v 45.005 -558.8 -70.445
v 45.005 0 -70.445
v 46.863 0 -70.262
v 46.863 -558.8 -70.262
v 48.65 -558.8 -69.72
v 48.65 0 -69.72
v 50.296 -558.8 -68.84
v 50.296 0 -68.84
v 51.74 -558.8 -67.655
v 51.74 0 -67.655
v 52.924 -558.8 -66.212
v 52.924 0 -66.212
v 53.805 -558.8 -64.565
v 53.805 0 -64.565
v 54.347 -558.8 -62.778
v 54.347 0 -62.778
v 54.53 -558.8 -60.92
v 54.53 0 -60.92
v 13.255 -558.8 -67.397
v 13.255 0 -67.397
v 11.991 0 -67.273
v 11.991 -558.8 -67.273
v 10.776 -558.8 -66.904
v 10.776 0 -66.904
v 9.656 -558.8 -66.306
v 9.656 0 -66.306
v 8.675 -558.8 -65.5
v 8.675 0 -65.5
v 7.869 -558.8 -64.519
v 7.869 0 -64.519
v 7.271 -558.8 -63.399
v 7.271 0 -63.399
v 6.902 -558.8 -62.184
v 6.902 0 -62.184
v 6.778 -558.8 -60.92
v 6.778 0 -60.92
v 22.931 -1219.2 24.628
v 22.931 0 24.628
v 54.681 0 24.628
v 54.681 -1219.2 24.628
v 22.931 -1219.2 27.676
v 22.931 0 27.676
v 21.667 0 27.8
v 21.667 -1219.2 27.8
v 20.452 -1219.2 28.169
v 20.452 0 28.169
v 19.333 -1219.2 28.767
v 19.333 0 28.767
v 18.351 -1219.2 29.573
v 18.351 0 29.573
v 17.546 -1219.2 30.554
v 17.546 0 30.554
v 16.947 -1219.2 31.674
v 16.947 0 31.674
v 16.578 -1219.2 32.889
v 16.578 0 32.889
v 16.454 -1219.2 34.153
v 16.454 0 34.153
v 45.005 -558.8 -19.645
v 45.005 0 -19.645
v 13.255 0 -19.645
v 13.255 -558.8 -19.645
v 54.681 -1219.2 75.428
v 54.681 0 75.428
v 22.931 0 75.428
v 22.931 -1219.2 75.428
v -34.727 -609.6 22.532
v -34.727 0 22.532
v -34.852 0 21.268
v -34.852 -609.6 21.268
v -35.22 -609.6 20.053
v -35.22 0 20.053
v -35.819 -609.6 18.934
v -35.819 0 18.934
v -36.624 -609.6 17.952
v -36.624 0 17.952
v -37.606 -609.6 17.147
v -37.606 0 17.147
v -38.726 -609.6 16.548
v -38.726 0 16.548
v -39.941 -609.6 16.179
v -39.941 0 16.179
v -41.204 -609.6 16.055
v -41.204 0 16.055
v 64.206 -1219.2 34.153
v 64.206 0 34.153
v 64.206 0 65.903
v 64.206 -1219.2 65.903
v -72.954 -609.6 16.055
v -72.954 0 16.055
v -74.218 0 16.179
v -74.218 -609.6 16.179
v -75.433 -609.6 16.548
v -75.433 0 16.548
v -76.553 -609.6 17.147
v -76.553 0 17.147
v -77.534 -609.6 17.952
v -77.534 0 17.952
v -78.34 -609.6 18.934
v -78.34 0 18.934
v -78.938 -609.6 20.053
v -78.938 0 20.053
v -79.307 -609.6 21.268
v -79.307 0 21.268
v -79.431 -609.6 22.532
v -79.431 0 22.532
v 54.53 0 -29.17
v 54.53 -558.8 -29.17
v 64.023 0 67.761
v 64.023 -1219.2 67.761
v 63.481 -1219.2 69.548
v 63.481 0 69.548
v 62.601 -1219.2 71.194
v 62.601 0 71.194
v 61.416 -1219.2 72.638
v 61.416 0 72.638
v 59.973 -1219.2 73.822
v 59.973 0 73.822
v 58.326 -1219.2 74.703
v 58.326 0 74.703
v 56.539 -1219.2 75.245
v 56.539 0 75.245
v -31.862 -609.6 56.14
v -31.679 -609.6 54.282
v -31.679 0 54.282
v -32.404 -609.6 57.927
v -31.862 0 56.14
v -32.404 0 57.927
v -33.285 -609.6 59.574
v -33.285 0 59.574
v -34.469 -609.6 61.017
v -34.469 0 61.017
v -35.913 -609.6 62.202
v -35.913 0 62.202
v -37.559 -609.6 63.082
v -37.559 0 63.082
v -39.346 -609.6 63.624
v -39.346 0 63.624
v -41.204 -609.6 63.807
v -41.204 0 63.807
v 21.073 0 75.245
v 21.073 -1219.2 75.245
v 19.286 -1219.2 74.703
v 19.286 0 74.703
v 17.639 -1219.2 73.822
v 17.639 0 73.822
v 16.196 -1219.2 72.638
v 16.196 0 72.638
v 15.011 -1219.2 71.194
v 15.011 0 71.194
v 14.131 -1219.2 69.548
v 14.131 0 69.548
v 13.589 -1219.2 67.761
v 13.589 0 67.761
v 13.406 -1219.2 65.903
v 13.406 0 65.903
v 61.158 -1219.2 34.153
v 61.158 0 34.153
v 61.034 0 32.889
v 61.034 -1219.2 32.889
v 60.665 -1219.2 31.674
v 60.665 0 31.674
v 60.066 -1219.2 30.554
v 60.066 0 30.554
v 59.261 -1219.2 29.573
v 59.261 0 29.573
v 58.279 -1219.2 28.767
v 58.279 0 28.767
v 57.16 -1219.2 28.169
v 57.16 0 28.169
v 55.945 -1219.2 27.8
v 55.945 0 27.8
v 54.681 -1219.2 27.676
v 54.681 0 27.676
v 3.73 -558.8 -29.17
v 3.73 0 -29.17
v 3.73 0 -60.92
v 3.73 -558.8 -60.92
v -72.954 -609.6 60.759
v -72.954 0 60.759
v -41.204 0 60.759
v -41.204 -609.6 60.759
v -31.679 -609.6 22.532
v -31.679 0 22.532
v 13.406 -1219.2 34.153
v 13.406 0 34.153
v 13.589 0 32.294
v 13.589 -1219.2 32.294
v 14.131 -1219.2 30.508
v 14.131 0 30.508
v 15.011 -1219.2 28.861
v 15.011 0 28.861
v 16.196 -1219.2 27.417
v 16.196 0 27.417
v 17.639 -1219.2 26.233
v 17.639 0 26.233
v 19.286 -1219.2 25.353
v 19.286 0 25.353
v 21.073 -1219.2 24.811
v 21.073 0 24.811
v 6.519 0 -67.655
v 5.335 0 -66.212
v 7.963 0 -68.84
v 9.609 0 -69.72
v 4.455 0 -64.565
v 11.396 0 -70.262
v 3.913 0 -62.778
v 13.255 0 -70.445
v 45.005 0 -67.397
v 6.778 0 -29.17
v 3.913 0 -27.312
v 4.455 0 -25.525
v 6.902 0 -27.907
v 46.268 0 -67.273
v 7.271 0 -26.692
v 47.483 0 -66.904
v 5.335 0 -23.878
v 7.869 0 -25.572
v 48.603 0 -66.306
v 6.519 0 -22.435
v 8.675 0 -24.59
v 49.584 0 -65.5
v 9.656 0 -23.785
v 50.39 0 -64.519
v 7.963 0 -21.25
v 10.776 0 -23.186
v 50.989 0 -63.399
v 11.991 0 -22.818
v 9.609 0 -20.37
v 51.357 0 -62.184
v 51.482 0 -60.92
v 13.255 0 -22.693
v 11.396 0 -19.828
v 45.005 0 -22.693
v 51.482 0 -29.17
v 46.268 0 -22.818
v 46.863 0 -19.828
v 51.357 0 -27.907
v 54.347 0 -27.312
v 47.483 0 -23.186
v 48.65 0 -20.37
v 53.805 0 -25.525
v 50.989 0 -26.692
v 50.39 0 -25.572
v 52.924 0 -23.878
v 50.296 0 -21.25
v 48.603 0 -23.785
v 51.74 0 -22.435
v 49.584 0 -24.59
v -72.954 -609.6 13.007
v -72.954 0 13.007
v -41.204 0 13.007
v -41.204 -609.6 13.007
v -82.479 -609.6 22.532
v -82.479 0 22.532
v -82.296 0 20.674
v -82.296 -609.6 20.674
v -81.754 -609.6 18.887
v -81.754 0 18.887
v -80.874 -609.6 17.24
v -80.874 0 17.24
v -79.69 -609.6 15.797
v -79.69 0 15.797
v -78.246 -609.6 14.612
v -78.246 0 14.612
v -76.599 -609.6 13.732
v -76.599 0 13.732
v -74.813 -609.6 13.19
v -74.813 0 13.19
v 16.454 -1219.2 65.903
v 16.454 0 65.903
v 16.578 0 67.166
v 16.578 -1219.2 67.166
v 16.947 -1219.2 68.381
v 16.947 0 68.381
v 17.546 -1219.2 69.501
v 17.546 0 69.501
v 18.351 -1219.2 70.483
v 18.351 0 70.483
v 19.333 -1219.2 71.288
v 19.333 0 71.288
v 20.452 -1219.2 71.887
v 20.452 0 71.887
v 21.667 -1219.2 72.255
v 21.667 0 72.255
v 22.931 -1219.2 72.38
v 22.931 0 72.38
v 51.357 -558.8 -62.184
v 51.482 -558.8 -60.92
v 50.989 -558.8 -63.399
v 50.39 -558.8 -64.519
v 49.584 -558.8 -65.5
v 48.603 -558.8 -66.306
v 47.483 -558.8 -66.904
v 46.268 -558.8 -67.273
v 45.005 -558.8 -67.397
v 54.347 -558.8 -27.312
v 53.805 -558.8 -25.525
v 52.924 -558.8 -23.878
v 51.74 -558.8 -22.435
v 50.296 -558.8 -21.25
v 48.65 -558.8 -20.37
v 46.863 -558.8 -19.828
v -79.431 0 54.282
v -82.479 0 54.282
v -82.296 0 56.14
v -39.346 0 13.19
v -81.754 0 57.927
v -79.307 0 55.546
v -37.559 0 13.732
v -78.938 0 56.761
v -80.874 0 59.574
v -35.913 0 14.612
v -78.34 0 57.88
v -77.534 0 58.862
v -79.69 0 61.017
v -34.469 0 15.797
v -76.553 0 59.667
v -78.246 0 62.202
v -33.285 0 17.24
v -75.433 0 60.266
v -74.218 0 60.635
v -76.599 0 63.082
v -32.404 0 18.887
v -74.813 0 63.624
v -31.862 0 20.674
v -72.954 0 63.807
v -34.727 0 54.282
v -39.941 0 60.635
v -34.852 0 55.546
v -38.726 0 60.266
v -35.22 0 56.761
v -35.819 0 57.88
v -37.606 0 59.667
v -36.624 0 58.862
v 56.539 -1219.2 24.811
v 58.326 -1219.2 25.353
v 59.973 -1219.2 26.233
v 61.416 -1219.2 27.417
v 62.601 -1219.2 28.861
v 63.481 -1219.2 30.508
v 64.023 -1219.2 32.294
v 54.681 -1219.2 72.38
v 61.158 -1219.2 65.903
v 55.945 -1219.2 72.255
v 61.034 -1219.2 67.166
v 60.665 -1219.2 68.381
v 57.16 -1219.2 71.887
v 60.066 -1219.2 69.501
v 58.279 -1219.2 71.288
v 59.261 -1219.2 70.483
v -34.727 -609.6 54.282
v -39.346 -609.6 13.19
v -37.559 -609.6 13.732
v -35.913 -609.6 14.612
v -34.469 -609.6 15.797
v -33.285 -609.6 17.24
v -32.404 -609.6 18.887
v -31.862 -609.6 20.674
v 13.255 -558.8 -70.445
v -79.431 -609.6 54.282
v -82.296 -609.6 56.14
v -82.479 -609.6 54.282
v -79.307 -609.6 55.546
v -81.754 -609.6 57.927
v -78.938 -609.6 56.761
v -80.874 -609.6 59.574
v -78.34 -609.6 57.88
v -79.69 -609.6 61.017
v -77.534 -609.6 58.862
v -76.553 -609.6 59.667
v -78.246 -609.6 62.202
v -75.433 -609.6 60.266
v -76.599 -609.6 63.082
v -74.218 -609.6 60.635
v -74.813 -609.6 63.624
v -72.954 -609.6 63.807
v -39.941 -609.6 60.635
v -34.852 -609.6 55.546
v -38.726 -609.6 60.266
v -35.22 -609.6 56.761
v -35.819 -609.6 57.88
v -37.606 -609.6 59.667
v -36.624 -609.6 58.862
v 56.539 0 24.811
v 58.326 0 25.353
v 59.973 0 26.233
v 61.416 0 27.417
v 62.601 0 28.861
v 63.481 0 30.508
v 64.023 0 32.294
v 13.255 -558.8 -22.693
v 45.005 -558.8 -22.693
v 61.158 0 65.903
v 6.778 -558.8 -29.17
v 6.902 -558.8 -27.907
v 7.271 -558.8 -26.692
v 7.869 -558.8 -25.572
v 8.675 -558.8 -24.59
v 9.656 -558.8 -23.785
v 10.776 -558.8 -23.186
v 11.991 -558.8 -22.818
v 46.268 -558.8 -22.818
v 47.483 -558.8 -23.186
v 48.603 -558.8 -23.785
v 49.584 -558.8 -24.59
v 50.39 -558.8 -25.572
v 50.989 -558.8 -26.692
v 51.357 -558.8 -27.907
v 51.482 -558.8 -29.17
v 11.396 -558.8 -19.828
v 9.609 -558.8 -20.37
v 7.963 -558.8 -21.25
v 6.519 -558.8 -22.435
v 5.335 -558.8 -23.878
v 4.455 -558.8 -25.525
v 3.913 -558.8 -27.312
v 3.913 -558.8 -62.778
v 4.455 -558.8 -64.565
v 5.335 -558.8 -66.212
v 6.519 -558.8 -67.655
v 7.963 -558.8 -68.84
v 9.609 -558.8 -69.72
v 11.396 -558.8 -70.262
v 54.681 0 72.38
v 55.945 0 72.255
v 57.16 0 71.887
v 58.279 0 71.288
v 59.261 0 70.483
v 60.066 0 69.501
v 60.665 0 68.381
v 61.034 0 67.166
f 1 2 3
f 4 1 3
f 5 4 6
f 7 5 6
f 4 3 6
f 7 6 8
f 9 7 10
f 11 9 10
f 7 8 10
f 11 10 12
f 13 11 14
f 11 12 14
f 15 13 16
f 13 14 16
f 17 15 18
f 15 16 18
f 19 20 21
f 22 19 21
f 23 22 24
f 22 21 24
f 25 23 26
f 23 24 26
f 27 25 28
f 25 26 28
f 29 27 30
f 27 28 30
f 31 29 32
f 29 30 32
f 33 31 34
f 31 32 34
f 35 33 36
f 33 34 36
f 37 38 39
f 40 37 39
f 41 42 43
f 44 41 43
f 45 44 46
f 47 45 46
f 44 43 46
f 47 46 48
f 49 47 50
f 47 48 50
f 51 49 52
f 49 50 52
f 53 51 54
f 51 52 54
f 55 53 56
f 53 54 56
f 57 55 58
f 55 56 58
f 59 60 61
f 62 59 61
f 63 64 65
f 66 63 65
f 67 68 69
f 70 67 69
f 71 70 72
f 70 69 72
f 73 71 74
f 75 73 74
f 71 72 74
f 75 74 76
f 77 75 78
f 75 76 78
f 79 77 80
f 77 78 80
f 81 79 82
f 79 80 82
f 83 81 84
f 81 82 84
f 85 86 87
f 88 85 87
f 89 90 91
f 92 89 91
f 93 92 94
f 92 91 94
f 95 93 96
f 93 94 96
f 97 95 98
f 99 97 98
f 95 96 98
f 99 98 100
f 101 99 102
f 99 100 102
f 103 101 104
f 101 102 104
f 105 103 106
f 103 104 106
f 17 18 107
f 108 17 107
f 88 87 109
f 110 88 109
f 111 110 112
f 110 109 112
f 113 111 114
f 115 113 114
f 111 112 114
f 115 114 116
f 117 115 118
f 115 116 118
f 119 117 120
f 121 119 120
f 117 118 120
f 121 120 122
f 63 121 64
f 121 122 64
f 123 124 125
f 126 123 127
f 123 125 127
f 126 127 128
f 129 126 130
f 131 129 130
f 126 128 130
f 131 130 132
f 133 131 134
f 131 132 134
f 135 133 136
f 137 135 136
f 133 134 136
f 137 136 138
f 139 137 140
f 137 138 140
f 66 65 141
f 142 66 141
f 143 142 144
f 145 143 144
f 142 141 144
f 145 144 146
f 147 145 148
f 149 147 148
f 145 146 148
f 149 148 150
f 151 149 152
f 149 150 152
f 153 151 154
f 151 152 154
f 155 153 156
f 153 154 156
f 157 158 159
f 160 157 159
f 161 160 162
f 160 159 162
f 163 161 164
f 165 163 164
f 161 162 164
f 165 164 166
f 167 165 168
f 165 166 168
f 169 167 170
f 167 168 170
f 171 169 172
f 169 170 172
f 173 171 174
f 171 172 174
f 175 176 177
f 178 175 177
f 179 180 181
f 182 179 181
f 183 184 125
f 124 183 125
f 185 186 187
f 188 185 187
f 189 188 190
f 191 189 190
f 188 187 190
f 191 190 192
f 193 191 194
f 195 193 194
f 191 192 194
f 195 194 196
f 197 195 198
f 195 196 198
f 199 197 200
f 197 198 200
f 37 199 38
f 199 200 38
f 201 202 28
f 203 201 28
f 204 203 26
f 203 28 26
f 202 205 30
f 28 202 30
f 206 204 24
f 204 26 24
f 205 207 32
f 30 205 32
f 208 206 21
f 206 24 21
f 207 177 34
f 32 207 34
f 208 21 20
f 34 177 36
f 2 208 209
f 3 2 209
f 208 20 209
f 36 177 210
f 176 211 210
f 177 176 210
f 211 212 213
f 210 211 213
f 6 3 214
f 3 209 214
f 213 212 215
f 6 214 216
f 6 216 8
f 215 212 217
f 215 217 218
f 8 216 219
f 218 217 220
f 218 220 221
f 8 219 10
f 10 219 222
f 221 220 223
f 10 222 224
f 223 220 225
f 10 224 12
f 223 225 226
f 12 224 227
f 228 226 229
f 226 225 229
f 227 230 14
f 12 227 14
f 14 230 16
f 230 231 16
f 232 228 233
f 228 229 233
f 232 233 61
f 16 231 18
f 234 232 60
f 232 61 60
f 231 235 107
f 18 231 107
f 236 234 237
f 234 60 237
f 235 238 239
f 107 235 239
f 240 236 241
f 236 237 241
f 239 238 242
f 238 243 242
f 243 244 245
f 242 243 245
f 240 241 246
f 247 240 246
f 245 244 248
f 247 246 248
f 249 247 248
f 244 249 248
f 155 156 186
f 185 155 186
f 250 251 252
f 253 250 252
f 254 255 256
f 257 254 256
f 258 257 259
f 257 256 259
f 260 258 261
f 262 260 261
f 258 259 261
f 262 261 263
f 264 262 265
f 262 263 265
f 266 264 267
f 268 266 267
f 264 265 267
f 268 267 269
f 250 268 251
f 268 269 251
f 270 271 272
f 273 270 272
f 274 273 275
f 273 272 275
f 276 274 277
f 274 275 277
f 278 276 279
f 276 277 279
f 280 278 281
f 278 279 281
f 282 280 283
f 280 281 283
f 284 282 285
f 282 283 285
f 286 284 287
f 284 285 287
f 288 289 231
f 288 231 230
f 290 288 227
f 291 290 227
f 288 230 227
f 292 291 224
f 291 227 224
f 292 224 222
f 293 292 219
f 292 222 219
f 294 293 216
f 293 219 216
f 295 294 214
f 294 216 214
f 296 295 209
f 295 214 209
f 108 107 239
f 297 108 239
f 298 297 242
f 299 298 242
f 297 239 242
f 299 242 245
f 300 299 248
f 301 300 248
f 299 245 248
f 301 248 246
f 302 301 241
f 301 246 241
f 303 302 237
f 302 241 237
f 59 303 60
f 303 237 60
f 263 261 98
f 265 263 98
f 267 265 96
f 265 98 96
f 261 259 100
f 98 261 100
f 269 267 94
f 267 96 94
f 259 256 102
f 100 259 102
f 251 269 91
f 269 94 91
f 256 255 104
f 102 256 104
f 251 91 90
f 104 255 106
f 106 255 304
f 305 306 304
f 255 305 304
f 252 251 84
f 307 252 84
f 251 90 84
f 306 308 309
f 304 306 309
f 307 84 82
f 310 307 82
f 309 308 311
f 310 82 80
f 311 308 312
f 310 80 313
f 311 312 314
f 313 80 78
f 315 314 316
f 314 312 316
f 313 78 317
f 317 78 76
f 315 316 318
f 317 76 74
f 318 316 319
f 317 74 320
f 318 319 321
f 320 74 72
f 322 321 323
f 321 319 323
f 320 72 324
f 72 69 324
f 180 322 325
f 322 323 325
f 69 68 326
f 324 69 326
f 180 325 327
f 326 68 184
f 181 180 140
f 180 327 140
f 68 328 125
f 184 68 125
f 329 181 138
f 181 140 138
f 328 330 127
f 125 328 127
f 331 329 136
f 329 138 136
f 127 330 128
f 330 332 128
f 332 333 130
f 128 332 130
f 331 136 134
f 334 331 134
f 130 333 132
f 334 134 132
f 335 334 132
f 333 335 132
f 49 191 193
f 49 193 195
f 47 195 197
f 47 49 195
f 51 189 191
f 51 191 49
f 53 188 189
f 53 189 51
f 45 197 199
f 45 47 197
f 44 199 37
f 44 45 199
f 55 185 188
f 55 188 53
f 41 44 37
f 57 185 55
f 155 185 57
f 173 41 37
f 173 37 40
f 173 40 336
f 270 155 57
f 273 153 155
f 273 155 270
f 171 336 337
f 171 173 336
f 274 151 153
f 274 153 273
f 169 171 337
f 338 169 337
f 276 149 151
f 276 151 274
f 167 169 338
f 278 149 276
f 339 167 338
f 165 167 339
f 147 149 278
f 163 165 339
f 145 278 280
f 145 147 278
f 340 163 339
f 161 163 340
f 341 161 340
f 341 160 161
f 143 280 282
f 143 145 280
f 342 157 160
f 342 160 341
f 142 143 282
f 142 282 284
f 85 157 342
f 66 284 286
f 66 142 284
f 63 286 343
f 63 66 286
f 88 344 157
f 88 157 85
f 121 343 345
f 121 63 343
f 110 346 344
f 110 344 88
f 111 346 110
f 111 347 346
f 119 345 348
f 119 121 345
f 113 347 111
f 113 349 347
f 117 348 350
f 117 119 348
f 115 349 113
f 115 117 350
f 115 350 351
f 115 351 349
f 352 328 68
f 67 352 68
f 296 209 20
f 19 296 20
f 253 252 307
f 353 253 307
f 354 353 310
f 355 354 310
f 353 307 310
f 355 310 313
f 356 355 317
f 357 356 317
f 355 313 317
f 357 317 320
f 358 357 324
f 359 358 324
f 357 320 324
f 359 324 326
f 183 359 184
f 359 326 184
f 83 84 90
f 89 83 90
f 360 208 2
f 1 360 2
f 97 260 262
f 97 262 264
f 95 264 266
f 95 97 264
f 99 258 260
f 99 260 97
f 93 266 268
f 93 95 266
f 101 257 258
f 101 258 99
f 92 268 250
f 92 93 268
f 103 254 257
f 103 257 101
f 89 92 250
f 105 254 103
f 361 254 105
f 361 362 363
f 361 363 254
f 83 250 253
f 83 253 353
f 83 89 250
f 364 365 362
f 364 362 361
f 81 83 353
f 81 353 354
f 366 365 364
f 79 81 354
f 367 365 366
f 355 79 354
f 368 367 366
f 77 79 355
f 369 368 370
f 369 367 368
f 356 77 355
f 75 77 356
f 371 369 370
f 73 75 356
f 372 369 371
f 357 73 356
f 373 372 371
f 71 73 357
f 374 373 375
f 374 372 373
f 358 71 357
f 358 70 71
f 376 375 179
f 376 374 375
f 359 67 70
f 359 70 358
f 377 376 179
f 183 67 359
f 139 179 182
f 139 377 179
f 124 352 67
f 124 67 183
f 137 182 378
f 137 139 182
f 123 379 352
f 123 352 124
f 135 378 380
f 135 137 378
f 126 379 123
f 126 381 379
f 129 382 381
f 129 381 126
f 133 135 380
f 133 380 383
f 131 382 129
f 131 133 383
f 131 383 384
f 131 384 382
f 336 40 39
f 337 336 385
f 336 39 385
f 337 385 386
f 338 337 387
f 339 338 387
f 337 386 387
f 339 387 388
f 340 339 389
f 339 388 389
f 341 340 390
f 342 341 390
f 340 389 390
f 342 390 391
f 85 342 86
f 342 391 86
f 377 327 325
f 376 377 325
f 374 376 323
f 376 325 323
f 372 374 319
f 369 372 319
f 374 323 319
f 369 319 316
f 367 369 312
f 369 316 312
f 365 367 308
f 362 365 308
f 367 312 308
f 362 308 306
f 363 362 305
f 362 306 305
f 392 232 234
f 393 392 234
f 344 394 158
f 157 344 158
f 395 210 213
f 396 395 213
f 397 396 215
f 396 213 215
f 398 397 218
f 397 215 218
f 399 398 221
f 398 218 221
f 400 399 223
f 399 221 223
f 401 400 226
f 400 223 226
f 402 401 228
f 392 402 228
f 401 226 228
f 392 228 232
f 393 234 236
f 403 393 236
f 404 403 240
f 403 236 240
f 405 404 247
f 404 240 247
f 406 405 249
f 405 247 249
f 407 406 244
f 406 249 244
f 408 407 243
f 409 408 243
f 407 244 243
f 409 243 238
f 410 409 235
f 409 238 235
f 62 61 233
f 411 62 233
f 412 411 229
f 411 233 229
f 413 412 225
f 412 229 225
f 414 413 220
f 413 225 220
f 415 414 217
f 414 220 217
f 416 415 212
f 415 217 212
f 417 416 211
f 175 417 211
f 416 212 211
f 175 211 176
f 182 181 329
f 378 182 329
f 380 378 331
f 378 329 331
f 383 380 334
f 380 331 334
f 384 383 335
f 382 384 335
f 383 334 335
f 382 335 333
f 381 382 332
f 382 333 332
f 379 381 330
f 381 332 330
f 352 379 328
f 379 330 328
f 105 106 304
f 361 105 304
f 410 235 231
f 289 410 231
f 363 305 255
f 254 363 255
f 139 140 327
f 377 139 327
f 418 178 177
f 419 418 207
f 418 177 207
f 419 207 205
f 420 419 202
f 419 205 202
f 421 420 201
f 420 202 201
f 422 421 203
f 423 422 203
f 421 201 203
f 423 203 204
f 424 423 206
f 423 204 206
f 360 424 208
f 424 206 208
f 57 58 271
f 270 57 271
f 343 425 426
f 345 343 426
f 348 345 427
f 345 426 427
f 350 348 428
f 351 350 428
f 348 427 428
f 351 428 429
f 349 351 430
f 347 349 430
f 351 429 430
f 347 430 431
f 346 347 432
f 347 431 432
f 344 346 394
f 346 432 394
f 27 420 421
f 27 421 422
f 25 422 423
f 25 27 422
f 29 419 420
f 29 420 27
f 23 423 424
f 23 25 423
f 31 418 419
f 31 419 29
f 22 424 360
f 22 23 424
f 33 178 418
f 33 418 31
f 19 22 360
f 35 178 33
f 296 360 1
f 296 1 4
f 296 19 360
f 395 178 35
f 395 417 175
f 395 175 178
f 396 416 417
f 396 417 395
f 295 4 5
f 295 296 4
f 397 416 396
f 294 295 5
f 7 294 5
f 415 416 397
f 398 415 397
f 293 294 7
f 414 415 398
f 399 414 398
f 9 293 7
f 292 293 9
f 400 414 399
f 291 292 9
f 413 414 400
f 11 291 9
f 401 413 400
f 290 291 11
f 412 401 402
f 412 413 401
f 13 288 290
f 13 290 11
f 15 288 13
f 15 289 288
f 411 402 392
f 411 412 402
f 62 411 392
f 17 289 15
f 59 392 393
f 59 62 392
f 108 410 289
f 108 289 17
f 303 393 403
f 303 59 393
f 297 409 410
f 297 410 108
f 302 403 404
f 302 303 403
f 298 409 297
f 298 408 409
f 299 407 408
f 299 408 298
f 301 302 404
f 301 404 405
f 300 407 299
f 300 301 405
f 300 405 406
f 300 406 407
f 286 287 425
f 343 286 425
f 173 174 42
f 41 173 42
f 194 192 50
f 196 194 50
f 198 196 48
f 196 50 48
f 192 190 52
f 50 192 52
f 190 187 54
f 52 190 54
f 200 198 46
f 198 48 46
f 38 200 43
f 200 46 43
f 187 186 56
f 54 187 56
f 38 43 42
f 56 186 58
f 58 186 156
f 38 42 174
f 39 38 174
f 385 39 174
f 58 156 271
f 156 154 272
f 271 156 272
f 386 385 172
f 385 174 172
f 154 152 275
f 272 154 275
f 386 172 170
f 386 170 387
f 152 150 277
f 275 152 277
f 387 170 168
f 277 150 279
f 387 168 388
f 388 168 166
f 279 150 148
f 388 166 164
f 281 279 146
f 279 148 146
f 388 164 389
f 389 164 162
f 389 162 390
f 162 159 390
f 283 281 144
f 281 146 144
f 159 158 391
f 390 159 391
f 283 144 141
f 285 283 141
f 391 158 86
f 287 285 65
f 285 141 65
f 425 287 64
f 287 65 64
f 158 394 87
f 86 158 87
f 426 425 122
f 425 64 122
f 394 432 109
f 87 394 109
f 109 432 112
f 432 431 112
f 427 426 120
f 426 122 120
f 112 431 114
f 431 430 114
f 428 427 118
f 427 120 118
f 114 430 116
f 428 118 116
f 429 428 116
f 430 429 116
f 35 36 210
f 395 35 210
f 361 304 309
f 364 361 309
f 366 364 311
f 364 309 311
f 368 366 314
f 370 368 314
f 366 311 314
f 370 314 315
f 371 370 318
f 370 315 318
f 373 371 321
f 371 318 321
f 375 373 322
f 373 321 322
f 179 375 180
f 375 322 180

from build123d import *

# Parameters (mm, degrees)
F1_DEPTH = 609.6
F3_DEPTH = 1219.2
F5_DEPTH = 558.8


with BuildPart() as f1:
    # F0 (on Front) → F1 (new body)
    with BuildSketch(Plane.XZ):
        with BuildLine():
            Line((-41.20435, 63.806982), (-72.95435, 63.806982))
            ThreePointArc((-72.95435, 63.806982), (-79.689542, 61.017174), (-82.47935, 54.281982))
            Line((-82.47935, 54.281982), (-82.47935, 22.531982))
            ThreePointArc((-82.47935, 22.531982), (-79.689542, 15.79679), (-72.95435, 13.006982))
            Line((-72.95435, 13.006982), (-41.20435, 13.006982))
            ThreePointArc((-41.20435, 13.006982), (-34.469158, 15.79679), (-31.67935, 22.531982))
            Line((-31.67935, 22.531982), (-31.67935, 54.281982))
            ThreePointArc((-31.67935, 54.281982), (-34.469158, 61.017174), (-41.20435, 63.806982))
        make_face()
        with BuildLine():
            ThreePointArc((-79.43135, 54.281982), (-77.534281, 58.861912), (-72.95435, 60.758982))
            Line((-72.95435, 60.758982), (-41.20435, 60.758982))
            ThreePointArc((-41.20435, 60.758982), (-36.62442, 58.861912), (-34.72735, 54.281982))
            Line((-34.72735, 54.281982), (-34.72735, 22.531982))
            ThreePointArc((-34.72735, 22.531982), (-36.62442, 17.952051), (-41.20435, 16.054982))
            Line((-41.20435, 16.054982), (-72.95435, 16.054982))
            ThreePointArc((-72.95435, 16.054982), (-77.534281, 17.952051), (-79.43135, 22.531982))
            Line((-79.43135, 22.531982), (-79.43135, 54.281982))
        make_face(mode=Mode.SUBTRACT)
    extrude(amount=F1_DEPTH)


with BuildPart() as f3:
    # F2 (on Front) → F3 (new body)
    with BuildSketch(Plane.XZ):
        with BuildLine():
            Line((54.68104, 75.42762), (22.93104, 75.42762))
            ThreePointArc((22.93104, 75.42762), (16.195848, 72.637812), (13.40604, 65.90262))
            Line((13.40604, 65.90262), (13.40604, 34.15262))
            ThreePointArc((13.40604, 34.15262), (16.195848, 27.417428), (22.93104, 24.62762))
            Line((22.93104, 24.62762), (54.68104, 24.62762))
            ThreePointArc((54.68104, 24.62762), (61.416232, 27.417428), (64.20604, 34.15262))
            Line((64.20604, 34.15262), (64.20604, 65.90262))
            ThreePointArc((64.20604, 65.90262), (61.416232, 72.637812), (54.68104, 75.42762))
        make_face()
        with BuildLine():
            ThreePointArc((16.45404, 65.90262), (18.351109, 70.482551), (22.93104, 72.37962))
            Line((22.93104, 72.37962), (54.68104, 72.37962))
            ThreePointArc((54.68104, 72.37962), (59.26097, 70.482551), (61.15804, 65.90262))
            Line((61.15804, 65.90262), (61.15804, 34.15262))
            ThreePointArc((61.15804, 34.15262), (59.26097, 29.572689), (54.68104, 27.67562))
            Line((54.68104, 27.67562), (22.93104, 27.67562))
            ThreePointArc((22.93104, 27.67562), (18.351109, 29.572689), (16.45404, 34.15262))
            Line((16.45404, 34.15262), (16.45404, 65.90262))
        make_face(mode=Mode.SUBTRACT)
    extrude(amount=F3_DEPTH)


with BuildPart() as f5:
    # F4 (on Front) → F5 (new body)
    with BuildSketch(Plane.XZ):
        with BuildLine():
            Line((45.00455, -19.645152), (13.25455, -19.645152))
            ThreePointArc((13.25455, -19.645152), (6.519358, -22.43496), (3.72955, -29.170152))
            Line((3.72955, -29.170152), (3.72955, -60.920152))
            ThreePointArc((3.72955, -60.920152), (6.519358, -67.655344), (13.25455, -70.445152))
            Line((13.25455, -70.445152), (45.00455, -70.445152))
            ThreePointArc((45.00455, -70.445152), (51.739742, -67.655344), (54.52955, -60.920152))
            Line((54.52955, -60.920152), (54.52955, -29.170152))
            ThreePointArc((54.52955, -29.170152), (51.739742, -22.43496), (45.00455, -19.645152))
        make_face()
        with BuildLine():
            ThreePointArc((6.77755, -29.170152), (8.674619, -24.590222), (13.25455, -22.693152))
            Line((13.25455, -22.693152), (45.00455, -22.693152))
            ThreePointArc((45.00455, -22.693152), (49.58448, -24.590222), (51.48155, -29.170152))
            Line((51.48155, -29.170152), (51.48155, -60.920152))
            ThreePointArc((51.48155, -60.920152), (49.58448, -65.500083), (45.00455, -67.397152))
            Line((45.00455, -67.397152), (13.25455, -67.397152))
            ThreePointArc((13.25455, -67.397152), (8.674619, -65.500083), (6.77755, -60.920152))
            Line((6.77755, -60.920152), (6.77755, -29.170152))
        make_face(mode=Mode.SUBTRACT)
    extrude(amount=F5_DEPTH)


solid = Compound([f1.part, f3.part, f5.part])
